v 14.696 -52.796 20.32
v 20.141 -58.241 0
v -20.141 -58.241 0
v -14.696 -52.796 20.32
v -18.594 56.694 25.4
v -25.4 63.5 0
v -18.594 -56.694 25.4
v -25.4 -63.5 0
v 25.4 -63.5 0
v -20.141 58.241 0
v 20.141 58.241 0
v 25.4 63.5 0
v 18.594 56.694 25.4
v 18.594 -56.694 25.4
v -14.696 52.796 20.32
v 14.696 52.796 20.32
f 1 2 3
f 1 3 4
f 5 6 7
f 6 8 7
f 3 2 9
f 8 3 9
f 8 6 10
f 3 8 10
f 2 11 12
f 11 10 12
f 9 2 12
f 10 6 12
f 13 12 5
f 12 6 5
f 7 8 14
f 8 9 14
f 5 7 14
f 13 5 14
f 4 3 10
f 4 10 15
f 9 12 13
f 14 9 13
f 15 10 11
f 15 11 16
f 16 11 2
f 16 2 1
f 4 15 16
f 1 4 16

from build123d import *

# Parameters (mm, degrees)
F0_W     = 50.8
F0_H     = 127
F1_DEPTH = 25.4
F1_TAPER = 15
F2_T     = -5.08


with BuildPart() as f1:
    # F0 (on Top) → F1 (new body)
    with BuildSketch(Plane.XY):
        Rectangle(F0_W, F0_H)
    extrude(amount=F1_DEPTH, taper=F1_TAPER)

    # F2
    f2_openings = [f1.faces().sort_by_distance(p)[0] for p in [
        (0, 0, 0),
    ]]
    offset(amount=F2_T, openings=f2_openings)


solid = f1.part
